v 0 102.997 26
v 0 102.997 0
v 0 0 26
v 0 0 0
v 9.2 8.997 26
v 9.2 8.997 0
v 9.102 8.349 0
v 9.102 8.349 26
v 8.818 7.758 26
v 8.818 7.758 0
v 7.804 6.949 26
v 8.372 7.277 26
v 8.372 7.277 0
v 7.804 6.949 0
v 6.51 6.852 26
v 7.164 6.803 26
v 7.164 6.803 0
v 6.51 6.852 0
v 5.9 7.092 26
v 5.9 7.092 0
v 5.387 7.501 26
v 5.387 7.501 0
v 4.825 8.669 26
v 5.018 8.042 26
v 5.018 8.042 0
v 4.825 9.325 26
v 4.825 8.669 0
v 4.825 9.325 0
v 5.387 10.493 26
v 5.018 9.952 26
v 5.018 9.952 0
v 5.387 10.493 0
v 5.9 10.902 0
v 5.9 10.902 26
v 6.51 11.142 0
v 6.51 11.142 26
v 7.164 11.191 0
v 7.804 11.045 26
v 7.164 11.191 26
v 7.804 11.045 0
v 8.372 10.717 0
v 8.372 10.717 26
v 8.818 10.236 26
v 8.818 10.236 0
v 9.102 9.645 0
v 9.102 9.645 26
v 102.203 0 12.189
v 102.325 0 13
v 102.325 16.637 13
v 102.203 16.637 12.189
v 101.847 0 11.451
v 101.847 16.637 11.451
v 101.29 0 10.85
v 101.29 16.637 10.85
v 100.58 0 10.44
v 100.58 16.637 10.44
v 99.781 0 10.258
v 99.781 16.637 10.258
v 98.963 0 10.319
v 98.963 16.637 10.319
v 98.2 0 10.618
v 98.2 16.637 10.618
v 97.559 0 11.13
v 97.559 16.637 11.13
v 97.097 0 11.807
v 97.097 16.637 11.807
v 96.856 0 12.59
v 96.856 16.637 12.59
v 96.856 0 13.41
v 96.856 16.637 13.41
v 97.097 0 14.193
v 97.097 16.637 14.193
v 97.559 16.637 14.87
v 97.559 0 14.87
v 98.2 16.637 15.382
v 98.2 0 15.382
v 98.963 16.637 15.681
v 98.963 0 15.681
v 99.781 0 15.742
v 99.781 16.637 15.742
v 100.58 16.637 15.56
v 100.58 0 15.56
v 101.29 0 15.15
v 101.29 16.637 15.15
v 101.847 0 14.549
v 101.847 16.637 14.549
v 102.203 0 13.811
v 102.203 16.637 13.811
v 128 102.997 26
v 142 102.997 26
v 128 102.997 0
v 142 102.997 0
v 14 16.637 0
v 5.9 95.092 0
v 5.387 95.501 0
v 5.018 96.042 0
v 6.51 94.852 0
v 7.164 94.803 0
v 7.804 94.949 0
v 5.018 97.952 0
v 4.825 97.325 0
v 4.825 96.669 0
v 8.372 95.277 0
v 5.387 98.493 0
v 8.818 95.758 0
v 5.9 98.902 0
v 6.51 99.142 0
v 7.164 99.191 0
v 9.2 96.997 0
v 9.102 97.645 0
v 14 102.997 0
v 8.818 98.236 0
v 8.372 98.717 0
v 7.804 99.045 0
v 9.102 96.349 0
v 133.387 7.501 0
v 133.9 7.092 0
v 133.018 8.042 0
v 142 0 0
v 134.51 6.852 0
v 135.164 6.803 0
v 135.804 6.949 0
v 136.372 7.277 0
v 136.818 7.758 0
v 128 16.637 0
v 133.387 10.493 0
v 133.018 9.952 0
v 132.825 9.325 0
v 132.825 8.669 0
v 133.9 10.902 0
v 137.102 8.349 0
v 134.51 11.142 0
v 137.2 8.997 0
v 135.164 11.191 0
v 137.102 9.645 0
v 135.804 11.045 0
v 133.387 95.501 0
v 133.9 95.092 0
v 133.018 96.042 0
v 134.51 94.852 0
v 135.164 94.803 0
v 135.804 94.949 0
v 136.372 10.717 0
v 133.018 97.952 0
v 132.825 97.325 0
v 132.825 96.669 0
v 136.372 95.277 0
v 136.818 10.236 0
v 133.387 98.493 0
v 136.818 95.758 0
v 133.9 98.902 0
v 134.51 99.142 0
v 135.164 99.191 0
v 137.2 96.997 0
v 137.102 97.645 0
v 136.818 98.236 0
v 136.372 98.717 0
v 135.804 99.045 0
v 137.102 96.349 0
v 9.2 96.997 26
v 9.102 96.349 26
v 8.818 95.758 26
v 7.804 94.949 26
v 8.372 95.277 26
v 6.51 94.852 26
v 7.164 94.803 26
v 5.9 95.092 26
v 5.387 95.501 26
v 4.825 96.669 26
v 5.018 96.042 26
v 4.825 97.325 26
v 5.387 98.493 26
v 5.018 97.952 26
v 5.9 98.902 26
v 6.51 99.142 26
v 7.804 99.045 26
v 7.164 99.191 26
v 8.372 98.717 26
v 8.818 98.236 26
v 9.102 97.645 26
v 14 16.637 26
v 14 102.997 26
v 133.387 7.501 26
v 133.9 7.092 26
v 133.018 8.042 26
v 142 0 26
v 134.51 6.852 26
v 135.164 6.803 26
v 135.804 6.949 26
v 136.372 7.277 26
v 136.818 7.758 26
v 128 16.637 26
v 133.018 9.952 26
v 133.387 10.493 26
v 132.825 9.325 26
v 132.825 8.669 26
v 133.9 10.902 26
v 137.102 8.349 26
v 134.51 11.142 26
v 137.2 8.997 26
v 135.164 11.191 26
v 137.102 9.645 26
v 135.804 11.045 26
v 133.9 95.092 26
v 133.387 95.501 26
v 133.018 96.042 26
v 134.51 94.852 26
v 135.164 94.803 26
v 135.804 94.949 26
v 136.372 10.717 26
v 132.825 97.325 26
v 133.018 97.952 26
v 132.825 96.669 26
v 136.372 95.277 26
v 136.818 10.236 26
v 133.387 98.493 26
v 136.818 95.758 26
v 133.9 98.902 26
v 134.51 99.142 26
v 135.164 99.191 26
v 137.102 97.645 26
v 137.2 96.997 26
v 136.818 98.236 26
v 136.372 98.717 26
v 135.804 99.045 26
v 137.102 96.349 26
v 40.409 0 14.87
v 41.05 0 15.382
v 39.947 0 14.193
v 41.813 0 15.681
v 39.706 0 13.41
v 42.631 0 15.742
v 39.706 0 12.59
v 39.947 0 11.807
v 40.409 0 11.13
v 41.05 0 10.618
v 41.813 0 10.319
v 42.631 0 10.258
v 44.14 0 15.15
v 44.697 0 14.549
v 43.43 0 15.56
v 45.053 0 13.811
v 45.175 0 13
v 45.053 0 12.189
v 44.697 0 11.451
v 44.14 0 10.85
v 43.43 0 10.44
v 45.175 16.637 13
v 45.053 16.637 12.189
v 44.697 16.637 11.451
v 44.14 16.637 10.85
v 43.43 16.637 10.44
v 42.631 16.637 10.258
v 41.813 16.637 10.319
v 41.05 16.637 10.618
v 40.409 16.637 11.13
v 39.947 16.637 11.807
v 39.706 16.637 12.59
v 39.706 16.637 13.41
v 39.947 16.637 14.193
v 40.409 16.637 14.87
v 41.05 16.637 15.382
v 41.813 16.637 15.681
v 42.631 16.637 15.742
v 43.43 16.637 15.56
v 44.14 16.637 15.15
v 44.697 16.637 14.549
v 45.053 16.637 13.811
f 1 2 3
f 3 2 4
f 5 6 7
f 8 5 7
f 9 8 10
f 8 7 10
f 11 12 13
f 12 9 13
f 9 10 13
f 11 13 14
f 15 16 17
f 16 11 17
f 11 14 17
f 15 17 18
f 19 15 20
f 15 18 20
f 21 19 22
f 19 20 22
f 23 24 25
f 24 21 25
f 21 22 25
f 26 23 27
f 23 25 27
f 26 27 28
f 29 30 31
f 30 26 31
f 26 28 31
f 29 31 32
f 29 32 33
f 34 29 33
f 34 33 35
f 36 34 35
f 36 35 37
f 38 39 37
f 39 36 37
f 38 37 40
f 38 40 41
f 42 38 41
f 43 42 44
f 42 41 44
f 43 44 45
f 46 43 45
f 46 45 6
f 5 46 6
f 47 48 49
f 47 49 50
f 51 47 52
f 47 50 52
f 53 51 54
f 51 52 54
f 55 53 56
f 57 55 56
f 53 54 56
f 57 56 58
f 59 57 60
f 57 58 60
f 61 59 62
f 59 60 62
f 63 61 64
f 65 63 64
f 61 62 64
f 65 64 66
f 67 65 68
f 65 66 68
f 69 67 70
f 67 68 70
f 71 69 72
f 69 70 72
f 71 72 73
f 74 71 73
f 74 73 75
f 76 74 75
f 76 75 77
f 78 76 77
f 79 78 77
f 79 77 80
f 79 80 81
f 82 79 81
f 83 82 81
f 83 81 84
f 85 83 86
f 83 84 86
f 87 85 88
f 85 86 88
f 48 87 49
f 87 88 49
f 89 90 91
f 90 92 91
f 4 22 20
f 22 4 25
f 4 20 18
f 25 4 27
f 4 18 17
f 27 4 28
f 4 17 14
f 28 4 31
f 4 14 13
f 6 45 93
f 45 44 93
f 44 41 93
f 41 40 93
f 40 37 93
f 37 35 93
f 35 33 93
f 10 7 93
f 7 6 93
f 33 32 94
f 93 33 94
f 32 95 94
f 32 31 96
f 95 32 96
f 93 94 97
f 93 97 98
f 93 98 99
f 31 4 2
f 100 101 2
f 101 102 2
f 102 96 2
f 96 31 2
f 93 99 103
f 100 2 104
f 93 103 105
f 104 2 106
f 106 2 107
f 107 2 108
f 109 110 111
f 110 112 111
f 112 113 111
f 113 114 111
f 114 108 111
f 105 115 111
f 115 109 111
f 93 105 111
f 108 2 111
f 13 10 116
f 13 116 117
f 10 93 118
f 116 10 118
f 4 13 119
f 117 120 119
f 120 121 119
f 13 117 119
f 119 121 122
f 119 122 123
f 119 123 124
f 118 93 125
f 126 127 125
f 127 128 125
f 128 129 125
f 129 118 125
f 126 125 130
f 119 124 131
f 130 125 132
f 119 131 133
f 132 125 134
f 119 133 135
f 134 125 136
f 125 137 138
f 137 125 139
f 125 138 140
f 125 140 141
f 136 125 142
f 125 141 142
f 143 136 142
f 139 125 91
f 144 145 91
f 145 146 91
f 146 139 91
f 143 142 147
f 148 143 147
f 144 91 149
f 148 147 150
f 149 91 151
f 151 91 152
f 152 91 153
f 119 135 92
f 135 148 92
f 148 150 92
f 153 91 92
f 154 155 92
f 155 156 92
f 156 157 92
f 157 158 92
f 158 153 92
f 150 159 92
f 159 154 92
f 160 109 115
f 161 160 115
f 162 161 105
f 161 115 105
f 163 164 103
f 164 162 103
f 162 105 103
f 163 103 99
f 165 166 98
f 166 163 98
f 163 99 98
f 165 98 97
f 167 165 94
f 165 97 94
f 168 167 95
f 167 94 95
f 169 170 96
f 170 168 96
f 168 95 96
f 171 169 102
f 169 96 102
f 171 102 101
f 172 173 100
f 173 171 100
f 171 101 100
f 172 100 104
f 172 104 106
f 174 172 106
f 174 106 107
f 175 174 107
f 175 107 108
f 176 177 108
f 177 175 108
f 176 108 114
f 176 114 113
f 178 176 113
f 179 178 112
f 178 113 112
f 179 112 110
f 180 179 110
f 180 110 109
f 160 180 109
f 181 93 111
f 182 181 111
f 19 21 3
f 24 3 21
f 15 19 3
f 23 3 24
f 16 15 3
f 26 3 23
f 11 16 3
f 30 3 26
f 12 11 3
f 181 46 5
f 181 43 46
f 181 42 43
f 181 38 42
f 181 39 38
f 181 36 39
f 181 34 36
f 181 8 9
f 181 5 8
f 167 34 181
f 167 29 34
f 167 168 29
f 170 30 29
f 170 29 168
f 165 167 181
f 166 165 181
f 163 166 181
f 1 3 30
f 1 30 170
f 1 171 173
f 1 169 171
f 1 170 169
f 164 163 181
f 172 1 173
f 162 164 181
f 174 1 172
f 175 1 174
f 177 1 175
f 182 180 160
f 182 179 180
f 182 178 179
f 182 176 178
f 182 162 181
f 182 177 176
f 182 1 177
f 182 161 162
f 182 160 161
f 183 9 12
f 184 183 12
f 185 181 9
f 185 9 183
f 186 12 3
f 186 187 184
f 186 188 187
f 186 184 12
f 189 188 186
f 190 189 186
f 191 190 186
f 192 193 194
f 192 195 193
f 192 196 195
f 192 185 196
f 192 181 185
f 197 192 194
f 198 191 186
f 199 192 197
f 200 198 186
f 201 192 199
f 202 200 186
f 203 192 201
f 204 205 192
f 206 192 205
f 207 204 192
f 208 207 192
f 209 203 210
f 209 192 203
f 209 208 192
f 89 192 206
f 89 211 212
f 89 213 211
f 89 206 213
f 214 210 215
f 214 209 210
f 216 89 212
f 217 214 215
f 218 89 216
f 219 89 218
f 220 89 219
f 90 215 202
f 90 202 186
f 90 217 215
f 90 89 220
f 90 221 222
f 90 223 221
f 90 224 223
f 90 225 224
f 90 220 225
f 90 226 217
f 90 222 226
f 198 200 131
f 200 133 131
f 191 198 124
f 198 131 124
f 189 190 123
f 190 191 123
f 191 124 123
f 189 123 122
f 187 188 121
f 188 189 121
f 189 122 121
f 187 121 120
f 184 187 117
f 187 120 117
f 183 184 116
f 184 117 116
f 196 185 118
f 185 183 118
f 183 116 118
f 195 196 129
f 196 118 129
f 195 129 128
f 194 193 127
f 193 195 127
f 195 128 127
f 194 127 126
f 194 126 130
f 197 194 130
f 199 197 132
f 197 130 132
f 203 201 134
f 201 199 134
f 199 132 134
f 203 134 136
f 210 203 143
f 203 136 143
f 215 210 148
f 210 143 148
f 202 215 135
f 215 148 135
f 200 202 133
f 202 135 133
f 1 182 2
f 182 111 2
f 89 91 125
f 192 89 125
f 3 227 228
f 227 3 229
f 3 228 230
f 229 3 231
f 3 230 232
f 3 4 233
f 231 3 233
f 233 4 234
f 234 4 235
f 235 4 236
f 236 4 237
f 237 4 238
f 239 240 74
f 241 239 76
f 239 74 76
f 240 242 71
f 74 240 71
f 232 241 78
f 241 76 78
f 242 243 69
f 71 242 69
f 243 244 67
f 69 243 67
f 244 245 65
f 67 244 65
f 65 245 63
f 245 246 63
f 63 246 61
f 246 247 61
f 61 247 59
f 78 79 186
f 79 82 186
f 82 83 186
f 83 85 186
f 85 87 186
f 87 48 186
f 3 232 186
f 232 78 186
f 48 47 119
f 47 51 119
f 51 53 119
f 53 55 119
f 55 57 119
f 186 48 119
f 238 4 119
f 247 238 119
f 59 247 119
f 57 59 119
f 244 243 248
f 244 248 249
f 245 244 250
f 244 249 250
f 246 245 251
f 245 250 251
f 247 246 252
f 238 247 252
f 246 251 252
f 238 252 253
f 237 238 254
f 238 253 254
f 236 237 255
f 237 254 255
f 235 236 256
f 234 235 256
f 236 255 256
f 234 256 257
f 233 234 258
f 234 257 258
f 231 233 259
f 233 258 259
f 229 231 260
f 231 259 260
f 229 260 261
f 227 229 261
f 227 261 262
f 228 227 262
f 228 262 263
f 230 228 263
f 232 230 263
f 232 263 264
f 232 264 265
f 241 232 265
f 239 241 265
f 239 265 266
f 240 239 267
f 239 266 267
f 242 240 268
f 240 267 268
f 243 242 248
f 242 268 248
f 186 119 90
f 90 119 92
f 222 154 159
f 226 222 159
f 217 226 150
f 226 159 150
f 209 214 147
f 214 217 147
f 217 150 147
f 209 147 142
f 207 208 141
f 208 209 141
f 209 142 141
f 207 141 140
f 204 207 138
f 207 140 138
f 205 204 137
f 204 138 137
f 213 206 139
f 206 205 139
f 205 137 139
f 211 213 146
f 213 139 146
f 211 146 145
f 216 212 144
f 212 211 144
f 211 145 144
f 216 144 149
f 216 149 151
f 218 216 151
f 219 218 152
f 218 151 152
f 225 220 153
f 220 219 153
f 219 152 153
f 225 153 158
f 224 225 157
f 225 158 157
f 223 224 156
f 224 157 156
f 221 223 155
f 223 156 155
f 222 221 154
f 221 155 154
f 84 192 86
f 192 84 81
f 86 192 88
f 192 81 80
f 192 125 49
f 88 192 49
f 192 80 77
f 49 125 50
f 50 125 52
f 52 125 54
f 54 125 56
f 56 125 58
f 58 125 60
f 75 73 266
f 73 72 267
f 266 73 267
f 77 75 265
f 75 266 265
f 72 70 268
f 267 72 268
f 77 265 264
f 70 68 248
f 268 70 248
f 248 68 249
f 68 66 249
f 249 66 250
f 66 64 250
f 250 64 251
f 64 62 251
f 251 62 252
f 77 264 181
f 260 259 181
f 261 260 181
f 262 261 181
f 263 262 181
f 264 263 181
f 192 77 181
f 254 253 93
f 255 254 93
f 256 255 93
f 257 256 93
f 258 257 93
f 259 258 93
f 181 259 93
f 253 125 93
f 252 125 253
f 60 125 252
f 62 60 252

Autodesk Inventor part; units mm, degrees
ref_plane "YZ Plane" through (0, 0, 0) normal (1, 0, 0) x (0, 1, 0)
ref_plane "XZ Plane" through (0, 0, 0) normal (0, 1, 0) x (-1, 0, 0)
ref_plane "XY Plane" through (0, 0, 0) normal (0, 0, 1) x (1, 0, 0)
sketch "Sketch1" plane through (0, 0, 0) normal (0, 0, 1) x (1, 0, 0)
  line L0 (0, 102.997) -> (0, 0)
  line L1 (0, 0) -> (142, 0)
  line L2 (142, 0) -> (142, 102.997)
  line L3 (142, 102.997) -> (128, 102.997)
  line L4 (128, 102.997) -> (128, 16.637)
  line L5 (128, 16.637) -> (14, 16.637)
  line L6 (14, 16.637) -> (14, 102.997)
  line L7 (14, 102.997) -> (0, 102.997)
  circle A0 centre (7, 96.997) radius 2.2
  circle A1 centre (135, 96.997) radius 2.2
  circle A2 centre (7, 8.997) radius 2.2
  circle A3 centre (135, 8.997) radius 2.2
  line L8 (14, 102.997) -> (128, 102.997)
  line L9 (28, 102.997) -> (114, 102.997)
  line L10 (114, 0) -> (28, 0)
  line L11 (135, 96.997) -> (135, 8.997) construction
  line L12 (7, 96.997) -> (7, 8.997) construction
  point P0 (71, 102.997)
  dimension "d0" = 102.997
  dimension "d3" = 14
  dimension "d4" = 86.36
  dimension "d44" = 4.4
  dimension "d45" = 4.4
  dimension "d46" = 128
  dimension "d47" = 7
  dimension "d48" = 14
  dimension "d49" = 7
  dimension "d50" = 114
  dimension "d51" = 4.4
  dimension "d52" = 4.4
  dimension "d53" = 88
  dimension "d54" = 88
  dimension "d55" = 6
  dimension "d56" = 6
  dimension "d84" = 128
extrude "Extrusion1" add sketch "Sketch1" along normal blind 26 contours L7 L6 L5 L4 L3 L2 L1 L0
sketch "Sketch5" plane through (14, 16.637, 0) normal (0, 1, 0) x (1, 0, 0)
  line L0 (0, 0) -> (0, -26) projected
  line L1 (114, 0) -> (114, -26) projected
  line L2 (114, 0) -> (0, 0) construction
  line L3 (57, 0) -> (57, -26) construction
  line L4 (0, -13) -> (114, -13) construction
  circle A0 centre (28.425, -13) radius 2.75
  circle A1 centre (85.575, -13) radius 2.75
  point P0 (-14, 0)
  dimension "d57" = 5.5
  dimension "d58" = 28.575
extrude "Extrusion2" cut sketch "Sketch5" against normal blind 26
equation "\"d3\" = d48"
equation "\"d44\" = d45"
equation "\"d47\" = 0.5 * d48"
equation "\"d49\" = 0.5 * d3"
equation "\"d51\" = d44"
equation "\"d52\" = d45"
equation "\"d54\" = d53"
equation "\"d56\" = d55"
properties part number "Vertical Electronics Spacer"
